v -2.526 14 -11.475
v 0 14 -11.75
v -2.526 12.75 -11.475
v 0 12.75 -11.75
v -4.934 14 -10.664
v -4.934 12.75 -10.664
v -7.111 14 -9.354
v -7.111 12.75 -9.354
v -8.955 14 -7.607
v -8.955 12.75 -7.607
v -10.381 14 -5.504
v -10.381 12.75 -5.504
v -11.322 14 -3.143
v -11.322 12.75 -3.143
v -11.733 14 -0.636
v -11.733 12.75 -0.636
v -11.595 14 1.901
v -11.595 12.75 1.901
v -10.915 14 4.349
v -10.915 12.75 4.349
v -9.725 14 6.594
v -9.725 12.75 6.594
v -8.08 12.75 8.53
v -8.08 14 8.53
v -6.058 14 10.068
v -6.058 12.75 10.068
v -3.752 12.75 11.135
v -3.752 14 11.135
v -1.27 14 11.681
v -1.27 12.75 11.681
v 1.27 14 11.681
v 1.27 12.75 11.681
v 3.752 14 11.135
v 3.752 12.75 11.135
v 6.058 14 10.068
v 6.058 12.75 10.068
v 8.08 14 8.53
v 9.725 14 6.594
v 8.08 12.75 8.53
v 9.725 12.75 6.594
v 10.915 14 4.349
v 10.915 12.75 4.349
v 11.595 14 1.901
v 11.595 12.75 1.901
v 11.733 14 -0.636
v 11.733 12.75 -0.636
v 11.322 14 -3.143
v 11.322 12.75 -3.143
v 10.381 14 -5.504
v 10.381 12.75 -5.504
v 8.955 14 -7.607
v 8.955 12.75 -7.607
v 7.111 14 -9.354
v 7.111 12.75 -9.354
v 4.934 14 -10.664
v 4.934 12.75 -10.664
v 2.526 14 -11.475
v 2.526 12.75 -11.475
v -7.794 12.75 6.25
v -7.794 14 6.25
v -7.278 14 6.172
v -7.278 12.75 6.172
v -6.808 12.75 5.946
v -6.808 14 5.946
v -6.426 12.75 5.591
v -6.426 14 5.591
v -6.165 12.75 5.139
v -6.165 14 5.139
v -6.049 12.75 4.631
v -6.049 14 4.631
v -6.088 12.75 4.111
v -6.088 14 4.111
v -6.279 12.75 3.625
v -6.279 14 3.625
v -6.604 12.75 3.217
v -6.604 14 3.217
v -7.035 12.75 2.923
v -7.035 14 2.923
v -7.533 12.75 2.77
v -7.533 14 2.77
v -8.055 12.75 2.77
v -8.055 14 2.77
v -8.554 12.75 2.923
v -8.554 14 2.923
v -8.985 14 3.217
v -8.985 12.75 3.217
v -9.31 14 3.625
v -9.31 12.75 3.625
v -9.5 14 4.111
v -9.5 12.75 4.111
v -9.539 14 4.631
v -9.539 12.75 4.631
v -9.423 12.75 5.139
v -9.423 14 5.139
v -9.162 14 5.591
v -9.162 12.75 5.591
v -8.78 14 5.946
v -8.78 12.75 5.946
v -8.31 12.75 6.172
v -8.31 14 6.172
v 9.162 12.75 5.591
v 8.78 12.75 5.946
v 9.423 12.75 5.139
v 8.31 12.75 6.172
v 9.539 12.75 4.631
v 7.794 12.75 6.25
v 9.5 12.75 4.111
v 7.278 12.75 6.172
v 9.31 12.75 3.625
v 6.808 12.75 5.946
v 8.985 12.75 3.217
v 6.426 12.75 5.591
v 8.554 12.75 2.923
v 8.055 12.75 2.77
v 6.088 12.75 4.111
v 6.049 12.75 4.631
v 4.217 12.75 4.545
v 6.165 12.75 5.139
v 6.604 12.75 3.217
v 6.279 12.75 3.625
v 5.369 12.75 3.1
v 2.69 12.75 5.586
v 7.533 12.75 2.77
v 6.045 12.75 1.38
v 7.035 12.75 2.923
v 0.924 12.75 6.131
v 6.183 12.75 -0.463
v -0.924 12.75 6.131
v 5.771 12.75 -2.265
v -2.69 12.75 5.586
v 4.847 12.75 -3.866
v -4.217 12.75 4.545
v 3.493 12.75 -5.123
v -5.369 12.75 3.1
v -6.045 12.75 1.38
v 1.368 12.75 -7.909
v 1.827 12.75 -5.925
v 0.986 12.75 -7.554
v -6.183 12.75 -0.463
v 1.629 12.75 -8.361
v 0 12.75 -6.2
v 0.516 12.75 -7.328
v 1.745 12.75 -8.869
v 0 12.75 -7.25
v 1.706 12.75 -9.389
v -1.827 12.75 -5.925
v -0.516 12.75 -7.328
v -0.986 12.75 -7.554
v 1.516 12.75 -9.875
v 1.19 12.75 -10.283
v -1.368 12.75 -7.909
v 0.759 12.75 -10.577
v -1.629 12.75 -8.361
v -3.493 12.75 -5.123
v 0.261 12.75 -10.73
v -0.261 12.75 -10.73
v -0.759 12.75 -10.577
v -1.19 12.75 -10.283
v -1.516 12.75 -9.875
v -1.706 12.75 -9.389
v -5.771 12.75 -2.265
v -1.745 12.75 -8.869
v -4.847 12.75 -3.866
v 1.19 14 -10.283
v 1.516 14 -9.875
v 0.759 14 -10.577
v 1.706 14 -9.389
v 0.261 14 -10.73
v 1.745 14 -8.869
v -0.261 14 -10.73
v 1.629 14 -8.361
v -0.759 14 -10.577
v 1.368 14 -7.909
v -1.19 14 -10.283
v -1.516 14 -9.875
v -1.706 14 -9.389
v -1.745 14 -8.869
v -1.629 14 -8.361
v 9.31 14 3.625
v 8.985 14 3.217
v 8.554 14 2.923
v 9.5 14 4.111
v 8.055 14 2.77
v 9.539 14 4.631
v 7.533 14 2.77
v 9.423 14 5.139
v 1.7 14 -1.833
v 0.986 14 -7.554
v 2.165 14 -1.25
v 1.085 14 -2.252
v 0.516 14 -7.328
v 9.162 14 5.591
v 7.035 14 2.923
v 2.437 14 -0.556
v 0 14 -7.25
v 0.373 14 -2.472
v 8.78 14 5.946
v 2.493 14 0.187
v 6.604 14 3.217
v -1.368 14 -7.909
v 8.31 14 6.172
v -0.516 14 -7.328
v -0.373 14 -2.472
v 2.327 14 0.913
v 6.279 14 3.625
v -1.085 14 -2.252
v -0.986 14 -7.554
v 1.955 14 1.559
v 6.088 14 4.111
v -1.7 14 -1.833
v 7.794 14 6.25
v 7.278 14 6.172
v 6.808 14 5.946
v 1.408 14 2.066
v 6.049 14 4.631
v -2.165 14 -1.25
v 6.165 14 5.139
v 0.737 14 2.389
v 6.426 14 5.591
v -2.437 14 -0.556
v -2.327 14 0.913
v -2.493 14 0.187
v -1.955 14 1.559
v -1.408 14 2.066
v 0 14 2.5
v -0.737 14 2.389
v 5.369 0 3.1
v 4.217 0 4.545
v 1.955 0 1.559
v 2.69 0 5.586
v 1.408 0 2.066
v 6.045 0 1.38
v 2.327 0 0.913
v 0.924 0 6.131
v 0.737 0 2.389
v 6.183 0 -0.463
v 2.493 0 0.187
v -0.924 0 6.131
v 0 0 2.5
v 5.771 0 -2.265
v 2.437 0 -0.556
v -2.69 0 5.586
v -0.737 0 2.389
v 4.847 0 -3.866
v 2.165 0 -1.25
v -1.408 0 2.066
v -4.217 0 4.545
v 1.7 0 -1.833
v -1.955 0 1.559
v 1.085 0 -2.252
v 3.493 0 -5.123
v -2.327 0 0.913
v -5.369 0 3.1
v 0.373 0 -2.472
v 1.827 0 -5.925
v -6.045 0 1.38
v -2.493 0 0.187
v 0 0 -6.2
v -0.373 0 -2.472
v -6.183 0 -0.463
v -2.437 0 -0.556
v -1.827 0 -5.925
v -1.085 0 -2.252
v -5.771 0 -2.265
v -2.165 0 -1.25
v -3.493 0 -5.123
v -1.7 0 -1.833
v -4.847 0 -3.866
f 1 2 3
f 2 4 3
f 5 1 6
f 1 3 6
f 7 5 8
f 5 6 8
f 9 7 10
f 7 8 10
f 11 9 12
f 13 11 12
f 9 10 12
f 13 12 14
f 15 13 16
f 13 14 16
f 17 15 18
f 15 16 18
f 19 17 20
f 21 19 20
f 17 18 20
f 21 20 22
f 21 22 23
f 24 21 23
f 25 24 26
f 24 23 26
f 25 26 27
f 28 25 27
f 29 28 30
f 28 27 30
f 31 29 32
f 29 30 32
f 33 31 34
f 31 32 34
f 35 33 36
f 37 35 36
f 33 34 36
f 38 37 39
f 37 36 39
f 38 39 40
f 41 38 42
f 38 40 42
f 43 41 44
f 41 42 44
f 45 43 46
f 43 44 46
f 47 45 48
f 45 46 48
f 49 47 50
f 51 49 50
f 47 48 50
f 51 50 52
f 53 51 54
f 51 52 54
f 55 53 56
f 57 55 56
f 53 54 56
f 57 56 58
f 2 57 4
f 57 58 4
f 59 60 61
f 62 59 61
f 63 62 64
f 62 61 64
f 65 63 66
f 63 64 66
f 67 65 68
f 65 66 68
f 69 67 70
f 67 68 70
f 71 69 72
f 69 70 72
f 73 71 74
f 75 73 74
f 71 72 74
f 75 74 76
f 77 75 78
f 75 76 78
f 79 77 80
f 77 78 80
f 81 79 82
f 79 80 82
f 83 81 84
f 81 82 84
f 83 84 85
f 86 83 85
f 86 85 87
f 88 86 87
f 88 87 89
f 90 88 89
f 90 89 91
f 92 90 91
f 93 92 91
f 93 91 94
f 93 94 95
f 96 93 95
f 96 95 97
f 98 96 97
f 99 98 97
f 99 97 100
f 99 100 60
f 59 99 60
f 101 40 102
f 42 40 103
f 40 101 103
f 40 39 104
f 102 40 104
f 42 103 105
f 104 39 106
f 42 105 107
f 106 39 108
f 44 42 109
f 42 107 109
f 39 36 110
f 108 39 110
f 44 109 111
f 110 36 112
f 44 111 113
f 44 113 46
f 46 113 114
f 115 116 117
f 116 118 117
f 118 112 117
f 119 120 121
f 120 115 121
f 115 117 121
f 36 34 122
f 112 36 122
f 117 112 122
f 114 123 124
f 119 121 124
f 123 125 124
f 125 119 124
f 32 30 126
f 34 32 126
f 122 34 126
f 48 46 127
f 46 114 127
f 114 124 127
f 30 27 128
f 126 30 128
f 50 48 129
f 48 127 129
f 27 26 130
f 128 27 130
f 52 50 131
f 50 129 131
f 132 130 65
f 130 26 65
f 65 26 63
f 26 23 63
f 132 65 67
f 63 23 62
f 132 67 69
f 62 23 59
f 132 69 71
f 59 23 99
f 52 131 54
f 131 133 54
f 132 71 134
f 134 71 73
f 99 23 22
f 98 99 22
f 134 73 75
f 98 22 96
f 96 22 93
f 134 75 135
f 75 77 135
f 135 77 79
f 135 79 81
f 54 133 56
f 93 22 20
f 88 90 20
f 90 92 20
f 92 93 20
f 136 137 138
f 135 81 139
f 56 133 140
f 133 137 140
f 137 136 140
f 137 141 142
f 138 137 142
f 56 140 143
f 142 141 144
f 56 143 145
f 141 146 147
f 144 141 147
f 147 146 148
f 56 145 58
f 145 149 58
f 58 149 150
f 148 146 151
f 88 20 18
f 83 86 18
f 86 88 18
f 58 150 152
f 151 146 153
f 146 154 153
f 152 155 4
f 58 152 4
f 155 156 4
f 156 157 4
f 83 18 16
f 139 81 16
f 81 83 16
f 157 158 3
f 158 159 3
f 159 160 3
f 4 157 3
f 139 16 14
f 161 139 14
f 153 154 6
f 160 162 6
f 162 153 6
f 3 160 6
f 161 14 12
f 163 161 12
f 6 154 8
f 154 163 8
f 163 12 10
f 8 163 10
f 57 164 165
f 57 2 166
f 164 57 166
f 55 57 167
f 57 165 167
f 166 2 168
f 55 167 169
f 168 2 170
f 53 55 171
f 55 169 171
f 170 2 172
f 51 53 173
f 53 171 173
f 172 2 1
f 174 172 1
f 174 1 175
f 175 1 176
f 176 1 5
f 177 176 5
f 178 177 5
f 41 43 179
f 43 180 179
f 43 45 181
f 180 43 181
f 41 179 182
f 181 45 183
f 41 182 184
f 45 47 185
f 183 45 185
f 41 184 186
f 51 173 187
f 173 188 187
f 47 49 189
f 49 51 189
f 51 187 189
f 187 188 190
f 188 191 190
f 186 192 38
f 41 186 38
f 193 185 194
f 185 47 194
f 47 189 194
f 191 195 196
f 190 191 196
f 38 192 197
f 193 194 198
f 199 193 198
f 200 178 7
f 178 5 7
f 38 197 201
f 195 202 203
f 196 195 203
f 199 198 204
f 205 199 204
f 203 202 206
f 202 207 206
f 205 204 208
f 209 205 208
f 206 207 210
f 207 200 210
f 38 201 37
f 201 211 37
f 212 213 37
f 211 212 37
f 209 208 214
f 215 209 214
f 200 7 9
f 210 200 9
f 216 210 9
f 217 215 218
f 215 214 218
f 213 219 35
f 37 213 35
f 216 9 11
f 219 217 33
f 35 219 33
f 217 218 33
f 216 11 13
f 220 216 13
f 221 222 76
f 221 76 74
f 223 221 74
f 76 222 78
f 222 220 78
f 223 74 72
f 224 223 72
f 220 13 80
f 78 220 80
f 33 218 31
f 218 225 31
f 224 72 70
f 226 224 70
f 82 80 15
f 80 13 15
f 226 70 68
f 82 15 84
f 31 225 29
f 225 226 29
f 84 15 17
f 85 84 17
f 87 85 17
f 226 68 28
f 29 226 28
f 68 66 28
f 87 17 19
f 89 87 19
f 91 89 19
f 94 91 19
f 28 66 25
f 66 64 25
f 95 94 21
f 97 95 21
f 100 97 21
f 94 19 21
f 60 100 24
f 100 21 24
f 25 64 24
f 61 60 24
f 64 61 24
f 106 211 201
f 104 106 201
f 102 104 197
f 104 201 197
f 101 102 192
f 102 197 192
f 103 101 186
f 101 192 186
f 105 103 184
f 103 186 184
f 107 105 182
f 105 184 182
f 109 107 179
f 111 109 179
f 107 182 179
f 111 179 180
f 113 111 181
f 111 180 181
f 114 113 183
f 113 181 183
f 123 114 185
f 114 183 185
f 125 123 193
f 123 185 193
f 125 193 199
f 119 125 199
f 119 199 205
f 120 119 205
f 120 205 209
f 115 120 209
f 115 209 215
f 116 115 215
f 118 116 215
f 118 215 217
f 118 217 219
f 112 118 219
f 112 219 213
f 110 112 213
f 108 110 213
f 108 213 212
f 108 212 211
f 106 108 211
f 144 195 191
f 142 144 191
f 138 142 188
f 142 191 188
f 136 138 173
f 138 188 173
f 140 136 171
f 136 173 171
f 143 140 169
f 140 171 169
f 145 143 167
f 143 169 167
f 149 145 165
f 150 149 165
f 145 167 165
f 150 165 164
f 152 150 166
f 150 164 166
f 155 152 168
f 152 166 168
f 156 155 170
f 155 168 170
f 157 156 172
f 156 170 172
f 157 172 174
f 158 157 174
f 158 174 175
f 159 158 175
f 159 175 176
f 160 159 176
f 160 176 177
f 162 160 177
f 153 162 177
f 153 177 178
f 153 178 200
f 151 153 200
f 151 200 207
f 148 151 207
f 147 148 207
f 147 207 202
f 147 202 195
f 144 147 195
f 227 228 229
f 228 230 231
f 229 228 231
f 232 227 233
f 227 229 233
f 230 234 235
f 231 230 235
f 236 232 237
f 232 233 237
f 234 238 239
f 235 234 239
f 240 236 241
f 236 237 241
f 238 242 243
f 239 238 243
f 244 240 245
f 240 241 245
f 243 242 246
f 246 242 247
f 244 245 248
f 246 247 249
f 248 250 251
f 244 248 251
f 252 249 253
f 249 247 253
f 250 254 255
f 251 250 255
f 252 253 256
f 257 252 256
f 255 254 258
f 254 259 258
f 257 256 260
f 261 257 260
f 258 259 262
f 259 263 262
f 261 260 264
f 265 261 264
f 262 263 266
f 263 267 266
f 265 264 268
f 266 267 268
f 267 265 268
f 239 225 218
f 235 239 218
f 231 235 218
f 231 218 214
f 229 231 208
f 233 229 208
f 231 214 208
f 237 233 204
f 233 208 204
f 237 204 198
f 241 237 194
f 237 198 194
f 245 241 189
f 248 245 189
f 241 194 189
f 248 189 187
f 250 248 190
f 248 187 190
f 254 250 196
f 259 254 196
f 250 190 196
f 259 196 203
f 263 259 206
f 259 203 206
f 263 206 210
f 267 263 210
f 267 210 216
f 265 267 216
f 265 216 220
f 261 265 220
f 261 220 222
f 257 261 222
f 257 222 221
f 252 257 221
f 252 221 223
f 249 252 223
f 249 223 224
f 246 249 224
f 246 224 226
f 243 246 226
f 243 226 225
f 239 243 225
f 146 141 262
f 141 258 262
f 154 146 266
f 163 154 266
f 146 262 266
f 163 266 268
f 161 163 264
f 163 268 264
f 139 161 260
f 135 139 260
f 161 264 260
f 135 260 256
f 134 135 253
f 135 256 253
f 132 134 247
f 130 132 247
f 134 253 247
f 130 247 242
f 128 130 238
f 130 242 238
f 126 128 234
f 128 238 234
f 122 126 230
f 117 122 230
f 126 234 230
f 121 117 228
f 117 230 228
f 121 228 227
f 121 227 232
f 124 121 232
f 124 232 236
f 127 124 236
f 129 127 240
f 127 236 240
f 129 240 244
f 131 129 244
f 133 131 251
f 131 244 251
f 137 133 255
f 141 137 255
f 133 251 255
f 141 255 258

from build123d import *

# Parameters (mm, degrees)
SKETCH2_R          = 2.5
CUT_EXTRUDE1_DEPTH = 56
SKETCH3_R          = 1.75
CUT_EXTRUDE2_DEPTH = 10


with BuildPart() as part:
    # Sketch1 → Revolve1 (revolve)
    with BuildSketch(Plane.XY, mode=Mode.PRIVATE) as revolve1_sk:
        Polygon((0, 16.8), (2, 16.8), (2, 14), (11.75, 14), (11.75, 12.75), (6.2, 12.75), (6.2, 0), (0, 0), align=None)
    revolve(revolve1_sk.sketch.rotate(Axis((0, 0, 0), (0, 1, 0)), 90), axis=Axis((0, 0, 0), (0, 1, 0)))

    # Sketch2 → Cut-Extrude1 (cut)
    with BuildSketch(Plane(origin=(0, 16.8, 0), x_dir=(1, 0, 0), z_dir=(0, 1, 0))):
        with Locations(Location((0, 0, 0), (0, 0, 270))):
            Circle(SKETCH2_R)
    extrude(amount=-CUT_EXTRUDE1_DEPTH, mode=Mode.SUBTRACT)

    # Sketch3 → Cut-Extrude2 (cut)
    with BuildSketch(Plane(origin=(0, 14, 0), x_dir=(1, 0, 0), z_dir=(0, 1, 0))):
        with Locations(Location((0, 9, 0), (0, 0, 270))):
            Circle(SKETCH3_R)
        with Locations(Location((7.794228634, -4.5, 0), (0, 0, 270))):
            Circle(SKETCH3_R)
        with Locations(Location((-7.794228634, -4.5, 0), (0, 0, 270))):
            Circle(SKETCH3_R)
    extrude(amount=-CUT_EXTRUDE2_DEPTH, mode=Mode.SUBTRACT)


solid = part.part
